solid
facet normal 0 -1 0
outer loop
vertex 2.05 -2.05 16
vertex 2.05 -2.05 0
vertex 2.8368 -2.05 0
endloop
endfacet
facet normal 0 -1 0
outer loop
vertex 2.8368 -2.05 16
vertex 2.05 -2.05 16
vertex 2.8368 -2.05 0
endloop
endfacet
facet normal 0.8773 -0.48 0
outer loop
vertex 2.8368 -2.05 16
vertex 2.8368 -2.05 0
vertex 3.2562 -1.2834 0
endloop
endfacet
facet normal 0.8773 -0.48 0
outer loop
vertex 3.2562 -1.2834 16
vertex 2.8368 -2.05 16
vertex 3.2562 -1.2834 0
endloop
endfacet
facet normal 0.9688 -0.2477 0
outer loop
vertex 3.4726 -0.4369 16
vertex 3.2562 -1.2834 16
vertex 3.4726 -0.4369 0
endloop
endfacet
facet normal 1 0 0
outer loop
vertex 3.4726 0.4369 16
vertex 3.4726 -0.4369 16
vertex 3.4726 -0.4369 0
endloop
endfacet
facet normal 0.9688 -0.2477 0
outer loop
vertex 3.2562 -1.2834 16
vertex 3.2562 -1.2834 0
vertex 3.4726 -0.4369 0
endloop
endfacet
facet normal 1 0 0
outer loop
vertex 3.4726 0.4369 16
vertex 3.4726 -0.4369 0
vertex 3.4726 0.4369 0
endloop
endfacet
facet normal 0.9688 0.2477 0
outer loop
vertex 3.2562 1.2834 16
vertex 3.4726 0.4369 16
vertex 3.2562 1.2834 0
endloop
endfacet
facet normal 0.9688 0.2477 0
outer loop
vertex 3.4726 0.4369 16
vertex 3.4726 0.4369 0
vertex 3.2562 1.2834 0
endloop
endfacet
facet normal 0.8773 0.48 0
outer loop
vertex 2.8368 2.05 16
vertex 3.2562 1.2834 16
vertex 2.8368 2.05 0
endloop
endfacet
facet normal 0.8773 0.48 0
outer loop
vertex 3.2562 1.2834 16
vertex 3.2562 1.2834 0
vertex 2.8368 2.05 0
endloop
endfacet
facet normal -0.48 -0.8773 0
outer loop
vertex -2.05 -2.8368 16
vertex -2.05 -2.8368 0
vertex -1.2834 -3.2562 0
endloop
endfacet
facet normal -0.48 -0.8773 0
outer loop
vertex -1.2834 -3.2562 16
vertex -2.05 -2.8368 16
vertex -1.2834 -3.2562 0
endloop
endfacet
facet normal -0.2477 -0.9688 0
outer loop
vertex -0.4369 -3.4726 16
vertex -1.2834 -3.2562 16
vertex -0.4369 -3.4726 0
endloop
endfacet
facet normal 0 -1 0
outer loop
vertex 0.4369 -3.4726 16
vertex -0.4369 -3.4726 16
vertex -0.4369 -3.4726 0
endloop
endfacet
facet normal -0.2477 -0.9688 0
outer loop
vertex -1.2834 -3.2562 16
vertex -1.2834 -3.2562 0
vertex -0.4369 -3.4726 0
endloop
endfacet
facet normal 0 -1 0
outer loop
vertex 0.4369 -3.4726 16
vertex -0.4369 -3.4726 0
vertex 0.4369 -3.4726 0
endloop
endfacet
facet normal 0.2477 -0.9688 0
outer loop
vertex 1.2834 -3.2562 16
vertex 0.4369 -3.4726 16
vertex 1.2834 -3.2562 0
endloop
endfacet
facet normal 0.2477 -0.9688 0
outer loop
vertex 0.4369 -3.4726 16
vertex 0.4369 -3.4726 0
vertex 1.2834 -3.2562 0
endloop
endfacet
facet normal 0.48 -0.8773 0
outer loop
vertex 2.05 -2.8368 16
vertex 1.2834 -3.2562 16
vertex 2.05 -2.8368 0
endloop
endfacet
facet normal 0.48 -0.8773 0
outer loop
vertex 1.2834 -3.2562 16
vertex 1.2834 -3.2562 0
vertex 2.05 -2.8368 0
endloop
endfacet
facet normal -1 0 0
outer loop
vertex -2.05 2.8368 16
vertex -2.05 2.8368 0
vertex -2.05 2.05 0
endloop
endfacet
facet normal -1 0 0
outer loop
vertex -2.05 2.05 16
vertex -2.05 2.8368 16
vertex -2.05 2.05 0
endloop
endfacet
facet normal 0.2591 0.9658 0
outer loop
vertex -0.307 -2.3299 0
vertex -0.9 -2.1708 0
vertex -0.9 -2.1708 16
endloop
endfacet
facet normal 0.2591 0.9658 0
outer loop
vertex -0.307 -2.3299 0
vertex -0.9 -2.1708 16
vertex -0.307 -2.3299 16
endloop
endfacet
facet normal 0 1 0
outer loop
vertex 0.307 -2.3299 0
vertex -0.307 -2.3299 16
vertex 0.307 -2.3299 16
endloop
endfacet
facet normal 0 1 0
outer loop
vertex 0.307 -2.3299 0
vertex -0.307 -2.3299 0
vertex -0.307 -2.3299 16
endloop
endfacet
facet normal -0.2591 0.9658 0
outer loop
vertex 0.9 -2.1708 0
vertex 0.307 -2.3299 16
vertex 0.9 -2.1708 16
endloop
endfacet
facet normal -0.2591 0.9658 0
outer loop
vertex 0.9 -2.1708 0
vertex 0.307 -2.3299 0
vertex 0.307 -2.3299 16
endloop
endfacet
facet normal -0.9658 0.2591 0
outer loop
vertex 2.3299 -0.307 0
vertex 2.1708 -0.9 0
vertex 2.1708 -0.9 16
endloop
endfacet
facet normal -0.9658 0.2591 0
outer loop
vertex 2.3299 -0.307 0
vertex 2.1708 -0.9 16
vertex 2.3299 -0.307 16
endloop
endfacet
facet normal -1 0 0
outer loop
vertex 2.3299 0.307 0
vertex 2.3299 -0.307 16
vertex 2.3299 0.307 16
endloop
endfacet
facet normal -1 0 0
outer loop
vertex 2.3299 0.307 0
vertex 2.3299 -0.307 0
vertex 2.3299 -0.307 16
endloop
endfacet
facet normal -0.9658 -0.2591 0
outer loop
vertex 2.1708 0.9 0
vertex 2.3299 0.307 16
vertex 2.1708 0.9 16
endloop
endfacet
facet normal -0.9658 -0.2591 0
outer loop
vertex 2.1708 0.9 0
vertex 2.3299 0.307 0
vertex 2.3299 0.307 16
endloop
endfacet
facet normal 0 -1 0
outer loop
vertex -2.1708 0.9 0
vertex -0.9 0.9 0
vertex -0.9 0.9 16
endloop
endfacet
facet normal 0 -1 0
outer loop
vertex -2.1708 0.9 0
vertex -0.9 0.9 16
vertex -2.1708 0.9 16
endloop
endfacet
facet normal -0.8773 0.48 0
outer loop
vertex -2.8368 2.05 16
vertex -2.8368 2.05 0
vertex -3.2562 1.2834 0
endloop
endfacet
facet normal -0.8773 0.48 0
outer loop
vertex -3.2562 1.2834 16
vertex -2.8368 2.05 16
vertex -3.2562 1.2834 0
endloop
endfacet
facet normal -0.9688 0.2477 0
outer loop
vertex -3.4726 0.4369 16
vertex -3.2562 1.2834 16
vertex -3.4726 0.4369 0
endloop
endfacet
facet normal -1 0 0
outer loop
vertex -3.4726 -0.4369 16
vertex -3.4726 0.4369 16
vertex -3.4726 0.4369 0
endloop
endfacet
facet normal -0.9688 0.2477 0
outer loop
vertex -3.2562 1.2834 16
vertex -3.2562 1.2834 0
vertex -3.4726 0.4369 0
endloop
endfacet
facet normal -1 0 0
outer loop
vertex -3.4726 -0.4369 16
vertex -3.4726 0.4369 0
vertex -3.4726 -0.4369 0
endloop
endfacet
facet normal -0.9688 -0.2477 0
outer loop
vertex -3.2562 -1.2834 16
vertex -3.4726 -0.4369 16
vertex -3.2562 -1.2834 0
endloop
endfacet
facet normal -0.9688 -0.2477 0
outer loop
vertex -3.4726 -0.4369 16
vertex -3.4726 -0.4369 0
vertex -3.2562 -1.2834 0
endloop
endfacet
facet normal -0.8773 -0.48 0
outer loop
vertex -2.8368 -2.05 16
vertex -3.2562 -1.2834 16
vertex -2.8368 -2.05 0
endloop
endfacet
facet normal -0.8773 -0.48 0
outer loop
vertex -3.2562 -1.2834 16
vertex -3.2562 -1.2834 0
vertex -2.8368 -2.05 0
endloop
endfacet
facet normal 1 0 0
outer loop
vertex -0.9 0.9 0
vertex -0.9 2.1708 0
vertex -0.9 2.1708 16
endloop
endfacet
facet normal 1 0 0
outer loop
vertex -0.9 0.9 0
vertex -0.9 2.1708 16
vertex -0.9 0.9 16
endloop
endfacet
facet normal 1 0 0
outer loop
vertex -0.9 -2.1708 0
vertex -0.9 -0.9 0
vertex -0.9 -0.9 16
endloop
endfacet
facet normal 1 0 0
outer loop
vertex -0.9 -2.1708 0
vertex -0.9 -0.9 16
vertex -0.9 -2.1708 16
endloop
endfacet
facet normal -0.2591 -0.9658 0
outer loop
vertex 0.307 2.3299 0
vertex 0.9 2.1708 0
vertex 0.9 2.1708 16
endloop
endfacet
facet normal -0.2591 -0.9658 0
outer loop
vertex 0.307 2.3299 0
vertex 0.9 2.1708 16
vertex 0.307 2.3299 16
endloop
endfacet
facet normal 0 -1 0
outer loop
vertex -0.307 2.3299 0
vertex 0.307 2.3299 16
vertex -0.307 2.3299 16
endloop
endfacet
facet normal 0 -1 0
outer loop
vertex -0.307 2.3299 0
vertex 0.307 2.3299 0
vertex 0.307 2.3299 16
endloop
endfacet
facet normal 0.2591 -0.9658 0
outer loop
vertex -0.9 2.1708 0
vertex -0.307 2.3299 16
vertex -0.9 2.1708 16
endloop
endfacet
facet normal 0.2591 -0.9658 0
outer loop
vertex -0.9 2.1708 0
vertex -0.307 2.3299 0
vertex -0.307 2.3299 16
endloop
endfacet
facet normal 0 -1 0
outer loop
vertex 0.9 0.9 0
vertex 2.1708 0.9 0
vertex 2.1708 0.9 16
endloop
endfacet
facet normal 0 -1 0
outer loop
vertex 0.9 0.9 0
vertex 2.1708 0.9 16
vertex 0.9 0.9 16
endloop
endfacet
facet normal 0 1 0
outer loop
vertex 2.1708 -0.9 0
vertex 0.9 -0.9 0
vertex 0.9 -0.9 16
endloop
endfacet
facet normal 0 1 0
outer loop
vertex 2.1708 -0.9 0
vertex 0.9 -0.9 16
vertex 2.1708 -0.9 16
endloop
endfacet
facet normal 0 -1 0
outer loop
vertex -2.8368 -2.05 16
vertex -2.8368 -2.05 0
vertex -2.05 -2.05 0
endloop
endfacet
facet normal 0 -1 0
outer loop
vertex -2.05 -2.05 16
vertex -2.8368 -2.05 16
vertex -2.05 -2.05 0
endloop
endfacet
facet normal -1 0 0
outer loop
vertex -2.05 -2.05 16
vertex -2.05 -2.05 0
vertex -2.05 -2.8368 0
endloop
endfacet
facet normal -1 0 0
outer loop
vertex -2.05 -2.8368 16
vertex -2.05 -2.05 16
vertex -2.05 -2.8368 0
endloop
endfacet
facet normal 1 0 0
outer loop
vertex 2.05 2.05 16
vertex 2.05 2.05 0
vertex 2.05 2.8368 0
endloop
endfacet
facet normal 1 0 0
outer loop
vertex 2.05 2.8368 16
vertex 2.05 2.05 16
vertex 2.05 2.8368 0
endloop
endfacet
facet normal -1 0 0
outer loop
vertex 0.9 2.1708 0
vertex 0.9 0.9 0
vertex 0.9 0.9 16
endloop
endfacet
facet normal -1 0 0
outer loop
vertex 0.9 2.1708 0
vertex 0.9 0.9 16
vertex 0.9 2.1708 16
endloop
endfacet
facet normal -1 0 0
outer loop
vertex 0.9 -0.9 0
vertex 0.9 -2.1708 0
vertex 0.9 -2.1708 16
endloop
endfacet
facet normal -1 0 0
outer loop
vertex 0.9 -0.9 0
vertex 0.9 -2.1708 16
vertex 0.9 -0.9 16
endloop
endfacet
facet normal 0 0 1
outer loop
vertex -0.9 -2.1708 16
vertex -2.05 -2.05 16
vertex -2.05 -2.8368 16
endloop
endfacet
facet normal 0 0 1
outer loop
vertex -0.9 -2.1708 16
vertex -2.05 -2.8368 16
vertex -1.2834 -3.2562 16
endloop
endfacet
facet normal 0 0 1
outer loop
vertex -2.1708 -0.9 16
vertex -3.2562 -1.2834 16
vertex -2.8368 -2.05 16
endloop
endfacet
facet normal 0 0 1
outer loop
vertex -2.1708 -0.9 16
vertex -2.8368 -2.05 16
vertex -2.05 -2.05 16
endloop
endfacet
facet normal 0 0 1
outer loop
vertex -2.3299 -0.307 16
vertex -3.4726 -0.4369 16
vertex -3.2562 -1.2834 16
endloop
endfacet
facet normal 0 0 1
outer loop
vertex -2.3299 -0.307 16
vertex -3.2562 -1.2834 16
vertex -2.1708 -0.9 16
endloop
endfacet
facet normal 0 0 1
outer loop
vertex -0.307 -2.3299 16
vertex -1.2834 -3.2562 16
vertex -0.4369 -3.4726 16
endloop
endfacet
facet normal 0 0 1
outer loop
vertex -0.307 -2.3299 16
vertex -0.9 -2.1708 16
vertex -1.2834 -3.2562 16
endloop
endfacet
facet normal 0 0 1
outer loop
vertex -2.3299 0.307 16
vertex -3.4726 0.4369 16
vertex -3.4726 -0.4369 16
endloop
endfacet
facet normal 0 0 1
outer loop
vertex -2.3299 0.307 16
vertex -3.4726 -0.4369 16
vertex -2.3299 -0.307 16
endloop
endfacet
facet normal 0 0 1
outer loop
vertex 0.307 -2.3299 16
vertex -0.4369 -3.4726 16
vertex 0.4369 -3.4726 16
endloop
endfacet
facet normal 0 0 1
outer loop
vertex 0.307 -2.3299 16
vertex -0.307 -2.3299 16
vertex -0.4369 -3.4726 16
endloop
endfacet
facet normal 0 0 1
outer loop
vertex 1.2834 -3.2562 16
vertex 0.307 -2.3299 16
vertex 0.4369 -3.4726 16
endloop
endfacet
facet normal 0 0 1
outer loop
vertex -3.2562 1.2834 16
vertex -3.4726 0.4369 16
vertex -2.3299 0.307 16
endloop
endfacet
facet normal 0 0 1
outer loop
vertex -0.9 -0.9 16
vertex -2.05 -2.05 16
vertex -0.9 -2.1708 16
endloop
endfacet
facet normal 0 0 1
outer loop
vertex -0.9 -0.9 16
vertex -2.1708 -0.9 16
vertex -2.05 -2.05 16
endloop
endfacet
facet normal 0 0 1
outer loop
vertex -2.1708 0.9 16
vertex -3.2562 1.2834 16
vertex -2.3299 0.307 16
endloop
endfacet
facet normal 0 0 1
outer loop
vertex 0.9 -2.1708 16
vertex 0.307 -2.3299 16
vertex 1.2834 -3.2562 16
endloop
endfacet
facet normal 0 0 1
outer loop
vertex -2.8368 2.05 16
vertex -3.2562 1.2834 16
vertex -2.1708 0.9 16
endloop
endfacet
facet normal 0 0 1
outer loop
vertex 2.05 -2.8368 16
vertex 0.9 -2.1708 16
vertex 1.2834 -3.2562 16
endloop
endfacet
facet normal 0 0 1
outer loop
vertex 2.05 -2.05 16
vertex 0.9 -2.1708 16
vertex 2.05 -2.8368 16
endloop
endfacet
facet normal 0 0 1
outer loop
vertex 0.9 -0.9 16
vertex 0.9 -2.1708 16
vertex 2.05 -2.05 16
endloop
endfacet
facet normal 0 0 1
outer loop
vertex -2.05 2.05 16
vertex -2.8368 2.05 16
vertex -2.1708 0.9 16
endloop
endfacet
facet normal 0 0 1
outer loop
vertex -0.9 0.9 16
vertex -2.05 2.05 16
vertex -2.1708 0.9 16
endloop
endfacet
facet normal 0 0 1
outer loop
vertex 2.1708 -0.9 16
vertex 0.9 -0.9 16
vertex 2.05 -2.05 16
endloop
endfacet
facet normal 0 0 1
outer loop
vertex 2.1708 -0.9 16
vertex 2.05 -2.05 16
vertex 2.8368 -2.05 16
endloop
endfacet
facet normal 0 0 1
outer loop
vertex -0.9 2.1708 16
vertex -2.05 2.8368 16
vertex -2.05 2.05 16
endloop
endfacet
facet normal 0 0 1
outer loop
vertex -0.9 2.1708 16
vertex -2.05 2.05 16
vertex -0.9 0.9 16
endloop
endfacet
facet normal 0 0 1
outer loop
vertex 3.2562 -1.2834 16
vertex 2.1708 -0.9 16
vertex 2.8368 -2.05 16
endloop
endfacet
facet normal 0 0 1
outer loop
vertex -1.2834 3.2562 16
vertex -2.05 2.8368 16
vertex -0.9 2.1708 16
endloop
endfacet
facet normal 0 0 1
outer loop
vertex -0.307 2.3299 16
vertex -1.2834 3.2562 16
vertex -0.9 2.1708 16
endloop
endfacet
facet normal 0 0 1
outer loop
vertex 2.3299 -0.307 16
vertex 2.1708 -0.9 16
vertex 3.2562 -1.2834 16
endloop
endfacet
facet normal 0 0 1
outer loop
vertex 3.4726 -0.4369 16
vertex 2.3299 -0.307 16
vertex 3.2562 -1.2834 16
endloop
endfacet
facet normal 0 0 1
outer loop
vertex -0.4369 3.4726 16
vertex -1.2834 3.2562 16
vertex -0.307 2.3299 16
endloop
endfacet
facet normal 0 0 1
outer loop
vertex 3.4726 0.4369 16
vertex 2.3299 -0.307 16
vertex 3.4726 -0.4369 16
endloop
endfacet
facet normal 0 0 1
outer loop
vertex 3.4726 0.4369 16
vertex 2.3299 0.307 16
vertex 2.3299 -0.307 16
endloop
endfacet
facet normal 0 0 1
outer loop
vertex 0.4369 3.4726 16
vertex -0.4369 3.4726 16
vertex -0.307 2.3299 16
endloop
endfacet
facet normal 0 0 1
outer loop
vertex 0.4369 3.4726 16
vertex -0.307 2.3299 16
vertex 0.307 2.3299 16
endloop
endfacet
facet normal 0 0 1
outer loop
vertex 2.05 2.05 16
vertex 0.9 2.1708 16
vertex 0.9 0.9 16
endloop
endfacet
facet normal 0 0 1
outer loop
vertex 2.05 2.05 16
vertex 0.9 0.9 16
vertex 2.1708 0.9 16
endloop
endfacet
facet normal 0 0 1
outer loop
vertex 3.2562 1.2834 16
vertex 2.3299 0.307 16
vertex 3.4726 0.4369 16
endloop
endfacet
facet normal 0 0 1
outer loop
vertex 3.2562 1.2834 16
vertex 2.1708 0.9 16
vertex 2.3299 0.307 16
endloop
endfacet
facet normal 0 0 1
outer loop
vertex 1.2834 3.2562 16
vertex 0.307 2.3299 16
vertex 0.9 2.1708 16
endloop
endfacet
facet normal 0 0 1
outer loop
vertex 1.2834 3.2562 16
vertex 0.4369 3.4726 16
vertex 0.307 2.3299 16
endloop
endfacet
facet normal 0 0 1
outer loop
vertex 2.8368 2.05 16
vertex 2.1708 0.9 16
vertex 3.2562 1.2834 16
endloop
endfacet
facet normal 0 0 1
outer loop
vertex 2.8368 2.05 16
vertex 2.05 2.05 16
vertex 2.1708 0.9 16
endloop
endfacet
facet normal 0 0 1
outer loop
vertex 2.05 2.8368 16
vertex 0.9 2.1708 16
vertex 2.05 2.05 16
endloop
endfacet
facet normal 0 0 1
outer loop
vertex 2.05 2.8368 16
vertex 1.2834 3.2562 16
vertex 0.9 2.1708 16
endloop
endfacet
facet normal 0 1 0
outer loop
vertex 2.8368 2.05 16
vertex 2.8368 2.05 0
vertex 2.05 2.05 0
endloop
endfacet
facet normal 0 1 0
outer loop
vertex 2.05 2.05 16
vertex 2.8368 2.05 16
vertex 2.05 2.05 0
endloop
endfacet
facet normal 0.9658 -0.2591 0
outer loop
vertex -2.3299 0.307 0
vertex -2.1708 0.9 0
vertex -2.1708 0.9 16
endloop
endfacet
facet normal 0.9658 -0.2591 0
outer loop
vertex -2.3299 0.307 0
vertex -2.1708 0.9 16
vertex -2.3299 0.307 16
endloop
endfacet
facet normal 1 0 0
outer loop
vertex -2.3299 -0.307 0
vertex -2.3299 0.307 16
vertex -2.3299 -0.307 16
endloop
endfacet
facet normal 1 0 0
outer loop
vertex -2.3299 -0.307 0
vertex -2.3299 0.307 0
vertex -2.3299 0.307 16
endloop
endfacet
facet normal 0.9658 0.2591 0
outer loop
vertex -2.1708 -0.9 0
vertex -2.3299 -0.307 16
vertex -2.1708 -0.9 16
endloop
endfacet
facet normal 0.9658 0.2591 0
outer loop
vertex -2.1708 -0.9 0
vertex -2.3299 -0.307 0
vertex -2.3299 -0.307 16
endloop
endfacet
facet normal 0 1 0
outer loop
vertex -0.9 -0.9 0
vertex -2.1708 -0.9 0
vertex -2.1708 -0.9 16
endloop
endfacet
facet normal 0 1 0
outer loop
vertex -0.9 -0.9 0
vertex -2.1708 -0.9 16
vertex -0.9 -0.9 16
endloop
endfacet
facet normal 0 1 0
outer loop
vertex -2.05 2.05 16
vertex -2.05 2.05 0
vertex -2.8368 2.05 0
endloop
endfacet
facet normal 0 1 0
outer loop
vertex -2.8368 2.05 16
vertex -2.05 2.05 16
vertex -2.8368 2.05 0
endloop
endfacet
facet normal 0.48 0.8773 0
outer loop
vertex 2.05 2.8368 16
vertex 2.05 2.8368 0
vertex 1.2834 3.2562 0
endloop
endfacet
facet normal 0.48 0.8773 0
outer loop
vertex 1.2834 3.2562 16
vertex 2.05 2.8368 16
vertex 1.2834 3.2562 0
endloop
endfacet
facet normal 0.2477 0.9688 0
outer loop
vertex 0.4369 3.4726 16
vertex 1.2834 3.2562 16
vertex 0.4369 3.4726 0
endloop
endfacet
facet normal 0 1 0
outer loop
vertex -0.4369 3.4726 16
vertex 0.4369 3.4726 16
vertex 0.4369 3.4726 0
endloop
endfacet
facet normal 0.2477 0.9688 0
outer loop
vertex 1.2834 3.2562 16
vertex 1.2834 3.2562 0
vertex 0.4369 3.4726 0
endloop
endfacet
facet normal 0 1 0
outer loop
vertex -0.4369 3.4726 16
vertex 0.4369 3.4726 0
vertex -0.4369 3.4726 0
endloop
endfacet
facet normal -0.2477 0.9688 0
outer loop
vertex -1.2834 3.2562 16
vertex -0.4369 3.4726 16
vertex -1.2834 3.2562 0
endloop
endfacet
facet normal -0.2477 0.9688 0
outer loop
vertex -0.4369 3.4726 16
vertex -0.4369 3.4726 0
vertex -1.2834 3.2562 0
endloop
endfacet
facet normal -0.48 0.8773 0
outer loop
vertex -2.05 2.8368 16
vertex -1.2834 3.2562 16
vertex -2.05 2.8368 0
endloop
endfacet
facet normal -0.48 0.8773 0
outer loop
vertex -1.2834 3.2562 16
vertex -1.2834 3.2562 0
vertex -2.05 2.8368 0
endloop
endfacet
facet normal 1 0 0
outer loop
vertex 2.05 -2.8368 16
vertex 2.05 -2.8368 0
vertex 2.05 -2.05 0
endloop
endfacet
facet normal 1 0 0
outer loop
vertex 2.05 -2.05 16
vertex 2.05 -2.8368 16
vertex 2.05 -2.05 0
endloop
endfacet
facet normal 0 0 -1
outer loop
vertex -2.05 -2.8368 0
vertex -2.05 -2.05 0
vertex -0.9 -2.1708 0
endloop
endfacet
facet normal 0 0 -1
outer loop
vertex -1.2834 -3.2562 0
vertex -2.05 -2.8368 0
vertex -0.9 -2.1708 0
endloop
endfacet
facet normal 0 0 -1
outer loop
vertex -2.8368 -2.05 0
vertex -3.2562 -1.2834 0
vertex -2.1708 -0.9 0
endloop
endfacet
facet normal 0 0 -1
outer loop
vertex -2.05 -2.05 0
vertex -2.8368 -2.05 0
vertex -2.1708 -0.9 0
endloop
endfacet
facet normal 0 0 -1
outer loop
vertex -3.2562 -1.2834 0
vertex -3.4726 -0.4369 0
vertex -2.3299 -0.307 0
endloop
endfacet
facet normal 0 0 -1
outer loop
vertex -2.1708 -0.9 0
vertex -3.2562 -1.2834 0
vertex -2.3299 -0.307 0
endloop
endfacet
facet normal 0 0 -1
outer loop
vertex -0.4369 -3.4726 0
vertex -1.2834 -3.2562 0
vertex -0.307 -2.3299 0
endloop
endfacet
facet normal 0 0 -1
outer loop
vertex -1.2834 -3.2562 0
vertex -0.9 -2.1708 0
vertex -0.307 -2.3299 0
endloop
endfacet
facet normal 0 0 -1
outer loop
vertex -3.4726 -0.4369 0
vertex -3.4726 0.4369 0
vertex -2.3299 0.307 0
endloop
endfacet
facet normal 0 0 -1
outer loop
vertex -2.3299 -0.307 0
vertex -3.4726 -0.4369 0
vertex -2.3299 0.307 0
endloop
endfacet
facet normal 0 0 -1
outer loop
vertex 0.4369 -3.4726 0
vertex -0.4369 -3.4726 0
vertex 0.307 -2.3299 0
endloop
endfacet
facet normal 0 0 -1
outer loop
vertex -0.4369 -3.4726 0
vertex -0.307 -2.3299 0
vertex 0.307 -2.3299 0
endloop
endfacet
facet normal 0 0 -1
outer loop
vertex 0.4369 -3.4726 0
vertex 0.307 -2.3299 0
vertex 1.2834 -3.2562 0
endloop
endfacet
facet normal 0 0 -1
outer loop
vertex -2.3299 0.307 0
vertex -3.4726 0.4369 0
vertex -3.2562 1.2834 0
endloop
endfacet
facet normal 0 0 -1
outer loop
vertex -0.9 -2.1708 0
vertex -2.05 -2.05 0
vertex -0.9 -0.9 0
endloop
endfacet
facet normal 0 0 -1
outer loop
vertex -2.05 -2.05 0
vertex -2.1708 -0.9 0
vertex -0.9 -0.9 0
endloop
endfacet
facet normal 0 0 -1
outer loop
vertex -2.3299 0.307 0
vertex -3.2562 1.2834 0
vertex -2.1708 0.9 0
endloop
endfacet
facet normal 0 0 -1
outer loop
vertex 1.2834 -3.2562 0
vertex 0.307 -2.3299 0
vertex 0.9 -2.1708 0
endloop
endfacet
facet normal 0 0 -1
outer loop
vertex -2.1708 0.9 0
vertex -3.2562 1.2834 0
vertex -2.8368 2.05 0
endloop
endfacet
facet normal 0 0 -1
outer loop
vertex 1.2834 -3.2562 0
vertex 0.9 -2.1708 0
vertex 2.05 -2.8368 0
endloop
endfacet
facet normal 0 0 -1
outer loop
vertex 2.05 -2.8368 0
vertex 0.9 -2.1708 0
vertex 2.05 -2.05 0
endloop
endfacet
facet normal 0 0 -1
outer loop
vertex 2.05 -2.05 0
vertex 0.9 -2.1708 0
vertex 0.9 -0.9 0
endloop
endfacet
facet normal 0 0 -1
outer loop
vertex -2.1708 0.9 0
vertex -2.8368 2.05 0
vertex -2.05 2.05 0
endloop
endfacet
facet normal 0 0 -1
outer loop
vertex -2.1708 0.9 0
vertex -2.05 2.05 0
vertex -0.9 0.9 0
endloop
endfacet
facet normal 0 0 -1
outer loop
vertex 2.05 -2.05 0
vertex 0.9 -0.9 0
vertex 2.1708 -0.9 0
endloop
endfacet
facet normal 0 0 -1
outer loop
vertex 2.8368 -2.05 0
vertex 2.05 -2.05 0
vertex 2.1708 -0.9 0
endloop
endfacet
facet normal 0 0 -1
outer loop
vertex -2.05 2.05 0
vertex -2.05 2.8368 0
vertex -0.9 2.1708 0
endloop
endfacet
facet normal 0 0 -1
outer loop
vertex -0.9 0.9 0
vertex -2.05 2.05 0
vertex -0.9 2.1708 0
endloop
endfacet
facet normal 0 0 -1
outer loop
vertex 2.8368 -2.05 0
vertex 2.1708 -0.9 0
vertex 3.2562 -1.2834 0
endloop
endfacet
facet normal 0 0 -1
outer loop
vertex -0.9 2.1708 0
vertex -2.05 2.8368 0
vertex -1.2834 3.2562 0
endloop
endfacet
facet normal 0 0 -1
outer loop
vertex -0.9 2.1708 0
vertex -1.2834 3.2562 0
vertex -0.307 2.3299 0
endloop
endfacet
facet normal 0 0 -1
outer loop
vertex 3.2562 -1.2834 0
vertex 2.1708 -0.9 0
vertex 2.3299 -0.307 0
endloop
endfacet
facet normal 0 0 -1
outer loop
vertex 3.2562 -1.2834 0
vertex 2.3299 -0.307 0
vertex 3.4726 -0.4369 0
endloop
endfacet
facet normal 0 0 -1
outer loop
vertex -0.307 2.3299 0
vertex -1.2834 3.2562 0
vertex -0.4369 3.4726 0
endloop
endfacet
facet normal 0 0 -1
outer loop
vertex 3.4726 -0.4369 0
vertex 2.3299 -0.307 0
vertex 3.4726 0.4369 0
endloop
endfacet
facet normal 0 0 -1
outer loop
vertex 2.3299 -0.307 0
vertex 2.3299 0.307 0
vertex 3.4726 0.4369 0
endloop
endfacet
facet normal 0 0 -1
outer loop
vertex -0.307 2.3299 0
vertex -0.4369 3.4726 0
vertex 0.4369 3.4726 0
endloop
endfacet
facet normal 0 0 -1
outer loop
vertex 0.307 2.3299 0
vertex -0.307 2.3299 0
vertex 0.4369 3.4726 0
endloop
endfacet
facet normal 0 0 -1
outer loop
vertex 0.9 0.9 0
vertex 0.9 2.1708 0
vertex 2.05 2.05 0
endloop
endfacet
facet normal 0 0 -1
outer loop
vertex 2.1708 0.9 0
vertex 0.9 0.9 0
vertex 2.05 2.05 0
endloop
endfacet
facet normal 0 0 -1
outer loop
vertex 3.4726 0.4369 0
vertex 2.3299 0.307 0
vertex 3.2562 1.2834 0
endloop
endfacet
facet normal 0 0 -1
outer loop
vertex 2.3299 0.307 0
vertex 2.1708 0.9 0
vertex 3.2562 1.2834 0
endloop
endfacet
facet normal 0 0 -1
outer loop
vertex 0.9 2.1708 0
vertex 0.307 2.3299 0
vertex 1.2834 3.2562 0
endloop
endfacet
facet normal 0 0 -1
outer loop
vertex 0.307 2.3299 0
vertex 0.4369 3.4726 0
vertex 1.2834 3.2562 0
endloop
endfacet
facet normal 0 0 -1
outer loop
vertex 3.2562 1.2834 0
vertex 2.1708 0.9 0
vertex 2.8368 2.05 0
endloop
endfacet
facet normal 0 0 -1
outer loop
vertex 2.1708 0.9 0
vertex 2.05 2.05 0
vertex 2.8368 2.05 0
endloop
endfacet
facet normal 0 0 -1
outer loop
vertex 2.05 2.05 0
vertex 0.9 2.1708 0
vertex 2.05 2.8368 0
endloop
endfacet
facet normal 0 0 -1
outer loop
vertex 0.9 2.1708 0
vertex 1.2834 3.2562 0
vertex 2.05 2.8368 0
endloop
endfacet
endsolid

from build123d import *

# Parameters (mm, degrees)
BOSS_EXTRUDE1_DEPTH = 16


with BuildPart() as part:
    # Sketch1 → Boss-Extrude1 (new body)
    with BuildSketch(Plane.XY):
        with BuildLine():
            Line((-2.05, 2.836811591), (-2.05, 2.05))
            Line((-2.05, 2.05), (-2.836811591, 2.05))
            ThreePointArc((-2.836811591, 2.05), (-3.5, 0), (-2.836811591, -2.05))
            Line((-2.836811591, -2.05), (-2.05, -2.05))
            Line((-2.05, -2.05), (-2.05, -2.836811591))
            ThreePointArc((-2.05, -2.836811591), (0, -3.5), (2.05, -2.836811591))
            Line((2.05, -2.836811591), (2.05, -2.05))
            Line((2.05, -2.05), (2.836811591, -2.05))
            ThreePointArc((2.836811591, -2.05), (3.5, 0), (2.836811591, 2.05))
            Line((2.836811591, 2.05), (2.05, 2.05))
            Line((2.05, 2.05), (2.05, 2.836811591))
            ThreePointArc((2.05, 2.836811591), (0, 3.5), (-2.05, 2.836811591))
        make_face()
        with BuildLine():
            Line((-0.9, 2.170829335), (-0.9, 0.9))
            Line((-0.9, 0.9), (-2.170829335, 0.9))
            ThreePointArc((-2.170829335, 0.9), (-2.35, 0), (-2.170829335, -0.9))
            Line((-2.170829335, -0.9), (-0.9, -0.9))
            Line((-0.9, -0.9), (-0.9, -2.170829335))
            ThreePointArc((-0.9, -2.170829335), (0, -2.35), (0.9, -2.170829335))
            Line((0.9, -2.170829335), (0.9, -0.9))
            Line((0.9, -0.9), (2.170829335, -0.9))
            ThreePointArc((2.170829335, -0.9), (2.35, 0), (2.170829335, 0.9))
            Line((2.170829335, 0.9), (0.9, 0.9))
            Line((0.9, 0.9), (0.9, 2.170829335))
            ThreePointArc((0.9, 2.170829335), (0, 2.35), (-0.9, 2.170829335))
        make_face(mode=Mode.SUBTRACT)
    extrude(amount=BOSS_EXTRUDE1_DEPTH)


solid = part.part
